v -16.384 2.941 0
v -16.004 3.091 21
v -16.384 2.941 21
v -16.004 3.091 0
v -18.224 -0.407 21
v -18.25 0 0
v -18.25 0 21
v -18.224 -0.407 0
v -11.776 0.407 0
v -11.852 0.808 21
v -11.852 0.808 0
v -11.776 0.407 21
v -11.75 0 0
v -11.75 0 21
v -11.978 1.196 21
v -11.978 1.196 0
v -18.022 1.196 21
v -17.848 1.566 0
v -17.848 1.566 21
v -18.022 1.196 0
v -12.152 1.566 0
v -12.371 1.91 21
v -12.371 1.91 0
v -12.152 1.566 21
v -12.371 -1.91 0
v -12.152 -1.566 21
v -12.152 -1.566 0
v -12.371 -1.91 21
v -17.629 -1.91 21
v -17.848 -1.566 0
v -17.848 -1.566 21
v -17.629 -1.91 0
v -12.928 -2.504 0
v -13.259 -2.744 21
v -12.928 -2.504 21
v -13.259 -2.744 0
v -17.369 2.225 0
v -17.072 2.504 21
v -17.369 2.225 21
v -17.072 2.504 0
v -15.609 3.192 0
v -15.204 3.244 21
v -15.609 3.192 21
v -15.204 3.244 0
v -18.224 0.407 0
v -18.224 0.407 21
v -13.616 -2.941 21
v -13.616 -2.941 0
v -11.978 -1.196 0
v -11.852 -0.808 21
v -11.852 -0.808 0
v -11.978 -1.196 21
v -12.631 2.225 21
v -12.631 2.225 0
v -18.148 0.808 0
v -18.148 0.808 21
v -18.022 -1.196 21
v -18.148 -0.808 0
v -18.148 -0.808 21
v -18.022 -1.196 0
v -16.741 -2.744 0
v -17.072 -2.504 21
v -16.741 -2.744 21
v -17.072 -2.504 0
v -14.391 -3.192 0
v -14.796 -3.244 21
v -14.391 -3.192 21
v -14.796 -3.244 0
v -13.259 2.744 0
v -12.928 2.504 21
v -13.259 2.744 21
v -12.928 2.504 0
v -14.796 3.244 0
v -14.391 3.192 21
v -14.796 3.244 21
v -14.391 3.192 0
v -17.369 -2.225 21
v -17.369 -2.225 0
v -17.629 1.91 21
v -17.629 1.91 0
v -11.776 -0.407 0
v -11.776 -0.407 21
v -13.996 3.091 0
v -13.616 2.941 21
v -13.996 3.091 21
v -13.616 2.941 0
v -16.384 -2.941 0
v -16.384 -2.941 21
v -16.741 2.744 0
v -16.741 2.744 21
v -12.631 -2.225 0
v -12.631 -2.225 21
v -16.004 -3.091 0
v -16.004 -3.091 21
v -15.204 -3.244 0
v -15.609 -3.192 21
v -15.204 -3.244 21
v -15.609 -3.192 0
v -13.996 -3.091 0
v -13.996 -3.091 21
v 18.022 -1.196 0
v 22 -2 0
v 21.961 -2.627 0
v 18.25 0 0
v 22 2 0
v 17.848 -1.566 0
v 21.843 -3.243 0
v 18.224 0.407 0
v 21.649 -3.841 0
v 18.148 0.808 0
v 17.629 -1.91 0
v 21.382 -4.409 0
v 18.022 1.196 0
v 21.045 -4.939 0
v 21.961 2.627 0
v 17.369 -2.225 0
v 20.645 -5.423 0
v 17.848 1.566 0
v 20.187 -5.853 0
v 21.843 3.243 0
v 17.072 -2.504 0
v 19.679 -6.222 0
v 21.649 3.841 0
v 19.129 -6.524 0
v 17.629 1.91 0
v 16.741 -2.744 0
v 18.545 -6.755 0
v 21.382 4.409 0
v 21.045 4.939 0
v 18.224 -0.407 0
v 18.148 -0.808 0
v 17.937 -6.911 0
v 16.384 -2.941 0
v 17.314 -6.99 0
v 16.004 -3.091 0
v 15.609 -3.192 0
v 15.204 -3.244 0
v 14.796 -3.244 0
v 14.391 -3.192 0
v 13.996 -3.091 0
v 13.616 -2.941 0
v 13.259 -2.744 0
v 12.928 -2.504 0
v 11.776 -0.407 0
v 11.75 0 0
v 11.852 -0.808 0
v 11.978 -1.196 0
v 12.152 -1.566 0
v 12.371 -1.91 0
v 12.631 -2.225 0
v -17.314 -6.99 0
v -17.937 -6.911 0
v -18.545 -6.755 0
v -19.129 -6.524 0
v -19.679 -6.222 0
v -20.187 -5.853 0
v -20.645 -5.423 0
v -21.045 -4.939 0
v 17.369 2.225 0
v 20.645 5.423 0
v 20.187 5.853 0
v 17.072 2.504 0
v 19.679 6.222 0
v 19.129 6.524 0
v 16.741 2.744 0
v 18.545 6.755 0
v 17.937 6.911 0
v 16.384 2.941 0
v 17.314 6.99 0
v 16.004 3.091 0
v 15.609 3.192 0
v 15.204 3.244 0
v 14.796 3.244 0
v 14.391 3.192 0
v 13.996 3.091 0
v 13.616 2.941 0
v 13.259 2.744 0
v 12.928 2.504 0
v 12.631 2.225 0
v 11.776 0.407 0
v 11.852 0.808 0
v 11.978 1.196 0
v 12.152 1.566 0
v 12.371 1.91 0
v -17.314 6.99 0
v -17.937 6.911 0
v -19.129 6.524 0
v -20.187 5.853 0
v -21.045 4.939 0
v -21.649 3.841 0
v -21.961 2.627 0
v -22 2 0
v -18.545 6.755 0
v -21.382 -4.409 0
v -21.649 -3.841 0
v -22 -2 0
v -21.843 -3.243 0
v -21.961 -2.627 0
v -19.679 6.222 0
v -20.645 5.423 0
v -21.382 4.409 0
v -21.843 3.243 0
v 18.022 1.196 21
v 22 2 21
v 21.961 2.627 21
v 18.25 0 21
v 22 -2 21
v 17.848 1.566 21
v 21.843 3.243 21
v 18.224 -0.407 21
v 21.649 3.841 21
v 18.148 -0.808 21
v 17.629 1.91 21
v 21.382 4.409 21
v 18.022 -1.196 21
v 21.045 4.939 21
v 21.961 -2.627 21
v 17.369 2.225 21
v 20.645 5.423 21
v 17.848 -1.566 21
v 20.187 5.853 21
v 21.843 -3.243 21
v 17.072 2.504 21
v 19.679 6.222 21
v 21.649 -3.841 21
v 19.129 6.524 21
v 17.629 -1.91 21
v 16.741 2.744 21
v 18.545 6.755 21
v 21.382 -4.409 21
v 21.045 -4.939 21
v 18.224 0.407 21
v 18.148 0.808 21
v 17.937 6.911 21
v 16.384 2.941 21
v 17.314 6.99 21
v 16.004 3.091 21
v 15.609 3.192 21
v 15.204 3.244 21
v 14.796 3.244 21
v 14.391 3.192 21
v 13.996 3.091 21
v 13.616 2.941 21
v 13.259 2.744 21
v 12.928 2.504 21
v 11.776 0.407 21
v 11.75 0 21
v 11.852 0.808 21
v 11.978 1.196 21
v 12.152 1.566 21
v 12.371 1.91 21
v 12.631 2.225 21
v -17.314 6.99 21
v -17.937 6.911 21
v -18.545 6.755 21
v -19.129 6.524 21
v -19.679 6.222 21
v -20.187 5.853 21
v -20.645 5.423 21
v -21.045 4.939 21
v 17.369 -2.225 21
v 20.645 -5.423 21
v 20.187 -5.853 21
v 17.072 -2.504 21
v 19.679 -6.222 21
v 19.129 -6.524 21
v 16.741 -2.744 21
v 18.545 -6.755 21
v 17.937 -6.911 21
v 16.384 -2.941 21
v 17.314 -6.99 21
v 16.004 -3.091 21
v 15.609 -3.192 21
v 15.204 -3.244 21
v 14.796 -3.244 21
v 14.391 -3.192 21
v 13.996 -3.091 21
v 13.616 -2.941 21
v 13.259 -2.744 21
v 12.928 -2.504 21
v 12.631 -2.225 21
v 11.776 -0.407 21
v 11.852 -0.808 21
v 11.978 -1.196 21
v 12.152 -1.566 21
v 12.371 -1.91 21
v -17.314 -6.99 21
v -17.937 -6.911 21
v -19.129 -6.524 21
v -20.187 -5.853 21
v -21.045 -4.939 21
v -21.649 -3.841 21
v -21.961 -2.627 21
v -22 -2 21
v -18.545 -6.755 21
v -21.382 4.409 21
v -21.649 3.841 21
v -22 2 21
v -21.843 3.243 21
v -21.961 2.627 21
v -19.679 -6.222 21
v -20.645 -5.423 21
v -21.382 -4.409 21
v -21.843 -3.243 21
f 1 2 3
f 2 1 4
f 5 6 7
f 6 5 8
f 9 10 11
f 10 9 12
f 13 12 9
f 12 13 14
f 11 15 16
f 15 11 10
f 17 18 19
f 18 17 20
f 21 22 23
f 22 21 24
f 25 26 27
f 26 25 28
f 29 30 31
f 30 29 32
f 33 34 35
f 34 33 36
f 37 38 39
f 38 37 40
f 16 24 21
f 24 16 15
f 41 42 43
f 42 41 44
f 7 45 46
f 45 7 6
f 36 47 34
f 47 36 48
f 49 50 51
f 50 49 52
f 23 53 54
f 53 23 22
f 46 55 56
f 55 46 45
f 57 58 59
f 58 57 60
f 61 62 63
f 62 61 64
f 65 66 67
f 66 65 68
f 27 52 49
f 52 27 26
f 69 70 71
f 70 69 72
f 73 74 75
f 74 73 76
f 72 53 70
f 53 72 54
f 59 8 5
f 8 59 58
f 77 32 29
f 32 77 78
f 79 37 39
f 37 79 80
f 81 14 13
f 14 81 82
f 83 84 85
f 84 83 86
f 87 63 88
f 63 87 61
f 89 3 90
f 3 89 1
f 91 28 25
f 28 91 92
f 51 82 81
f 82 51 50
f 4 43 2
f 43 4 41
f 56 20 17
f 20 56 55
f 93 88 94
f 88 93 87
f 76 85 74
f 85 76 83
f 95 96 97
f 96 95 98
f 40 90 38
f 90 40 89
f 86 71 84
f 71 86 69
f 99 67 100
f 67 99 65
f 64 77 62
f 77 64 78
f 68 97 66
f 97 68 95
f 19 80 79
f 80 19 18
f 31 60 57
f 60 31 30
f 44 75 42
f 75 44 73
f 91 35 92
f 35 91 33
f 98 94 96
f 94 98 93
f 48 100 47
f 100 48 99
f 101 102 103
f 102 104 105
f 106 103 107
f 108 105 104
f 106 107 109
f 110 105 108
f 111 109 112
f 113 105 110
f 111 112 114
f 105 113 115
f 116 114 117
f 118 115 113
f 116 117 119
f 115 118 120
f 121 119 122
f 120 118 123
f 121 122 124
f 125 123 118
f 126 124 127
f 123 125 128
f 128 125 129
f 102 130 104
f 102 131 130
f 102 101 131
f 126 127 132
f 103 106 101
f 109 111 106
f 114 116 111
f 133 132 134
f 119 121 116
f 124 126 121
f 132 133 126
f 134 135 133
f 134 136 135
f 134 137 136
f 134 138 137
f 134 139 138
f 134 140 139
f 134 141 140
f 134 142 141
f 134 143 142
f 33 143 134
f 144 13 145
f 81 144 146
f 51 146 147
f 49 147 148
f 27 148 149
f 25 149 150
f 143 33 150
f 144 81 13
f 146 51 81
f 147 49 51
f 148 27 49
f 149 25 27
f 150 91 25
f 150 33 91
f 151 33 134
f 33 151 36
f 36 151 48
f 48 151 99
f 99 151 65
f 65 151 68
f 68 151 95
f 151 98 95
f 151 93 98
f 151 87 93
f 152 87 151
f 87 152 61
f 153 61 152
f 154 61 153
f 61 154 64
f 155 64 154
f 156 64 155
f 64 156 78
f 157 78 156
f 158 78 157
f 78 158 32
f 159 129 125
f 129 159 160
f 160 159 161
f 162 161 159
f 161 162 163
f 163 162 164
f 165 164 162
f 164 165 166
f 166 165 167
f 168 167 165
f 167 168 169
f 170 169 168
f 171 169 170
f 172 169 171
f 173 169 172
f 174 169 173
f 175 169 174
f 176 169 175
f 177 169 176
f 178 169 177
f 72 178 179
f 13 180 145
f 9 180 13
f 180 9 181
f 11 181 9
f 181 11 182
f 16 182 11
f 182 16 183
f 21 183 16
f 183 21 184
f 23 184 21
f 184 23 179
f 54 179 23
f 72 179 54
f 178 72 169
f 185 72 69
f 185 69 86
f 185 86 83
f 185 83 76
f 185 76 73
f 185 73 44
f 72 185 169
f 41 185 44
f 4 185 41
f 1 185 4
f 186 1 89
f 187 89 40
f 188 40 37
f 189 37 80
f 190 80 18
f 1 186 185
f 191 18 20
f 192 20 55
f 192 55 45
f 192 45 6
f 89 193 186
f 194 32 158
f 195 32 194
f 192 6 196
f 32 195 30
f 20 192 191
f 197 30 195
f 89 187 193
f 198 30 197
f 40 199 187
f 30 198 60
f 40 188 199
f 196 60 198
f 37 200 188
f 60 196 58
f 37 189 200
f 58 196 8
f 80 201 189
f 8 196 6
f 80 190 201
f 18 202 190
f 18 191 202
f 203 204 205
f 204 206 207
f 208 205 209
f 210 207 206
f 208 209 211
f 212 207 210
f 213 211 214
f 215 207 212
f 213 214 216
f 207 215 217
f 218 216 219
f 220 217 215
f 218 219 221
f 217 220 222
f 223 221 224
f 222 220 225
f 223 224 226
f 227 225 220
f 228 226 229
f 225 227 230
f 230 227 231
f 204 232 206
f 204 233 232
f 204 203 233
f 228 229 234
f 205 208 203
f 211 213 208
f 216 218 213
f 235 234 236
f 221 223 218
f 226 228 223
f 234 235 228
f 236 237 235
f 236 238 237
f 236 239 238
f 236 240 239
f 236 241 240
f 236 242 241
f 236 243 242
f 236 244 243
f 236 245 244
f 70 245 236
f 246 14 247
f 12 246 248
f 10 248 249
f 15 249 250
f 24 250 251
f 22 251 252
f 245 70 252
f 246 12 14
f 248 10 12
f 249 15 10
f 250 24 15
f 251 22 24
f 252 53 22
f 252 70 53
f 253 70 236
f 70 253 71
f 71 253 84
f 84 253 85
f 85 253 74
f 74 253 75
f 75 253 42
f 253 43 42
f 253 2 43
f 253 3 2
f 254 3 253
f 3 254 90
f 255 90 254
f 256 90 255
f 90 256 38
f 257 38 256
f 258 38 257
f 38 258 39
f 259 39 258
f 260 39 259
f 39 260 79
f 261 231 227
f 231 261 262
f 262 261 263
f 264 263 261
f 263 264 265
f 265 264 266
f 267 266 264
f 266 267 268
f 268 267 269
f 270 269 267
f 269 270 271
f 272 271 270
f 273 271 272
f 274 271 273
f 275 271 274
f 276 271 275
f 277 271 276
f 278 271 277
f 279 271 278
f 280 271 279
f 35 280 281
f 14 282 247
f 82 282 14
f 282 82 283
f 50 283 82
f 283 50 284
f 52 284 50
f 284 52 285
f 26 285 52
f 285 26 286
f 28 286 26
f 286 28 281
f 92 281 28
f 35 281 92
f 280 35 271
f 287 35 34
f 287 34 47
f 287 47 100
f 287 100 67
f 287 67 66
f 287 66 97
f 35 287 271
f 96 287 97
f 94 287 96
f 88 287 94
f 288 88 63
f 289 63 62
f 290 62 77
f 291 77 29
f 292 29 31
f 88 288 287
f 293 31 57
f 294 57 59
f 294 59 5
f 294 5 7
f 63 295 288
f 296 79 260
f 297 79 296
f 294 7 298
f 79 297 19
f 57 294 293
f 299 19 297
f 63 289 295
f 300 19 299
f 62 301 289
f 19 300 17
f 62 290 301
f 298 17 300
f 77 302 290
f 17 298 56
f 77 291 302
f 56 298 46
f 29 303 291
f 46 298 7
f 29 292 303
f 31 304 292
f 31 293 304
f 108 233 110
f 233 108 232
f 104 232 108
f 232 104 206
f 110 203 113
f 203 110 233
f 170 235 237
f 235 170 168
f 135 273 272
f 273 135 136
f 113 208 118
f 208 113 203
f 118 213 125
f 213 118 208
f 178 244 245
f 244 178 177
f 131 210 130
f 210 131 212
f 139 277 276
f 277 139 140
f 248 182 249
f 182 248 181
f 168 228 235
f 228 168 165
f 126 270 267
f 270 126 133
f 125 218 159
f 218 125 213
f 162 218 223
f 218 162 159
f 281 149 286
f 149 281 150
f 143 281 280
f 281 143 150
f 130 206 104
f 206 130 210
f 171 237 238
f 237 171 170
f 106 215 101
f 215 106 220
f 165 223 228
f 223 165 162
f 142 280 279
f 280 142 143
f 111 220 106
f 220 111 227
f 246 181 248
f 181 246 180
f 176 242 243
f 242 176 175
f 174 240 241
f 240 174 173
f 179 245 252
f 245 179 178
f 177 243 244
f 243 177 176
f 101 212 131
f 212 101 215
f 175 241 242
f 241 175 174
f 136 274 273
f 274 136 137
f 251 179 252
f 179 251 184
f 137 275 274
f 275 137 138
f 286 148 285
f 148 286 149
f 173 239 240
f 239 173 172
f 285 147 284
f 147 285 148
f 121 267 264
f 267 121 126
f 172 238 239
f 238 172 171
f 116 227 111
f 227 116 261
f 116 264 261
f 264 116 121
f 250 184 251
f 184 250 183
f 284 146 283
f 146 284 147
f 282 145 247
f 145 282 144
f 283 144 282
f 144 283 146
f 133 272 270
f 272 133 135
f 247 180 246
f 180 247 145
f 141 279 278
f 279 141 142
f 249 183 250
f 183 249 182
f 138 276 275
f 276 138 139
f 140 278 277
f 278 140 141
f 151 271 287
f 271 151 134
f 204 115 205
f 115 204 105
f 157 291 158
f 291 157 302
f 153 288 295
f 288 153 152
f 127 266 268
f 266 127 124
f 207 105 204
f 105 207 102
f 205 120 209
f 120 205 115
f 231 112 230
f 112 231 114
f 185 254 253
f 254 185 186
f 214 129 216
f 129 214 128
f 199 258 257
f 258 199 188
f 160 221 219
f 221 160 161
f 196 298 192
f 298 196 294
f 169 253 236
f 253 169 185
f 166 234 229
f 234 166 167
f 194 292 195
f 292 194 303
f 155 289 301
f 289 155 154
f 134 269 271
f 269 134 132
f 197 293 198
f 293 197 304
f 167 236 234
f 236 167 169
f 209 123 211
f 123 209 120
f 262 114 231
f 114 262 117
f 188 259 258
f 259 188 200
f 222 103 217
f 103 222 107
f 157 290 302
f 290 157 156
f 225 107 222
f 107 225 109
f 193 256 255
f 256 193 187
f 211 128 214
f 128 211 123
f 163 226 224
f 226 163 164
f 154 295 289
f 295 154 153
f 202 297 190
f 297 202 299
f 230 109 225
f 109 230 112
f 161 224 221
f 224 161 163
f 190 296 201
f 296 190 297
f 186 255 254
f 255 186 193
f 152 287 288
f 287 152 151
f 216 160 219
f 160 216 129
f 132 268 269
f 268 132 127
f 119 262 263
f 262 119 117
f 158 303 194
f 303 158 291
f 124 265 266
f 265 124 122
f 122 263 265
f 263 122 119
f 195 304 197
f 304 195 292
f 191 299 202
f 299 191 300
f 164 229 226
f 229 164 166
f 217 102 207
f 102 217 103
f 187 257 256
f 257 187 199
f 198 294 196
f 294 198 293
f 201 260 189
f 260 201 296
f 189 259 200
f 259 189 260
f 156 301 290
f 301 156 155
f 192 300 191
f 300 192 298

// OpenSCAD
$fn = 50;


difference() {
	union() {
		hull() {
			translate(v = [-17.0000000000, 2.0000000000, 0]) {
				cylinder(h = 21, r = 5);
			}
			translate(v = [17.0000000000, 2.0000000000, 0]) {
				cylinder(h = 21, r = 5);
			}
			translate(v = [-17.0000000000, -2.0000000000, 0]) {
				cylinder(h = 21, r = 5);
			}
			translate(v = [17.0000000000, -2.0000000000, 0]) {
				cylinder(h = 21, r = 5);
			}
		}
	}
	union() {
		translate(v = [-15.0000000000, 0.0000000000, 0]) {
			cylinder(h = 21, r = 3.2500000000);
		}
		translate(v = [15.0000000000, 0.0000000000, 0]) {
			cylinder(h = 21, r = 3.2500000000);
		}
		translate(v = [-15.0000000000, 0.0000000000, 0]) {
			cylinder(h = 21, r = 1.8000000000);
		}
		translate(v = [15.0000000000, 0.0000000000, 0]) {
			cylinder(h = 21, r = 1.8000000000);
		}
		translate(v = [-15.0000000000, 0.0000000000, 0]) {
			cylinder(h = 21, r = 1.8000000000);
		}
		translate(v = [15.0000000000, 0.0000000000, 0]) {
			cylinder(h = 21, r = 1.8000000000);
		}
		translate(v = [-15.0000000000, 0.0000000000, 0]) {
			cylinder(h = 21, r = 1.8000000000);
		}
		translate(v = [15.0000000000, 0.0000000000, 0]) {
			cylinder(h = 21, r = 1.8000000000);
		}
	}
}
